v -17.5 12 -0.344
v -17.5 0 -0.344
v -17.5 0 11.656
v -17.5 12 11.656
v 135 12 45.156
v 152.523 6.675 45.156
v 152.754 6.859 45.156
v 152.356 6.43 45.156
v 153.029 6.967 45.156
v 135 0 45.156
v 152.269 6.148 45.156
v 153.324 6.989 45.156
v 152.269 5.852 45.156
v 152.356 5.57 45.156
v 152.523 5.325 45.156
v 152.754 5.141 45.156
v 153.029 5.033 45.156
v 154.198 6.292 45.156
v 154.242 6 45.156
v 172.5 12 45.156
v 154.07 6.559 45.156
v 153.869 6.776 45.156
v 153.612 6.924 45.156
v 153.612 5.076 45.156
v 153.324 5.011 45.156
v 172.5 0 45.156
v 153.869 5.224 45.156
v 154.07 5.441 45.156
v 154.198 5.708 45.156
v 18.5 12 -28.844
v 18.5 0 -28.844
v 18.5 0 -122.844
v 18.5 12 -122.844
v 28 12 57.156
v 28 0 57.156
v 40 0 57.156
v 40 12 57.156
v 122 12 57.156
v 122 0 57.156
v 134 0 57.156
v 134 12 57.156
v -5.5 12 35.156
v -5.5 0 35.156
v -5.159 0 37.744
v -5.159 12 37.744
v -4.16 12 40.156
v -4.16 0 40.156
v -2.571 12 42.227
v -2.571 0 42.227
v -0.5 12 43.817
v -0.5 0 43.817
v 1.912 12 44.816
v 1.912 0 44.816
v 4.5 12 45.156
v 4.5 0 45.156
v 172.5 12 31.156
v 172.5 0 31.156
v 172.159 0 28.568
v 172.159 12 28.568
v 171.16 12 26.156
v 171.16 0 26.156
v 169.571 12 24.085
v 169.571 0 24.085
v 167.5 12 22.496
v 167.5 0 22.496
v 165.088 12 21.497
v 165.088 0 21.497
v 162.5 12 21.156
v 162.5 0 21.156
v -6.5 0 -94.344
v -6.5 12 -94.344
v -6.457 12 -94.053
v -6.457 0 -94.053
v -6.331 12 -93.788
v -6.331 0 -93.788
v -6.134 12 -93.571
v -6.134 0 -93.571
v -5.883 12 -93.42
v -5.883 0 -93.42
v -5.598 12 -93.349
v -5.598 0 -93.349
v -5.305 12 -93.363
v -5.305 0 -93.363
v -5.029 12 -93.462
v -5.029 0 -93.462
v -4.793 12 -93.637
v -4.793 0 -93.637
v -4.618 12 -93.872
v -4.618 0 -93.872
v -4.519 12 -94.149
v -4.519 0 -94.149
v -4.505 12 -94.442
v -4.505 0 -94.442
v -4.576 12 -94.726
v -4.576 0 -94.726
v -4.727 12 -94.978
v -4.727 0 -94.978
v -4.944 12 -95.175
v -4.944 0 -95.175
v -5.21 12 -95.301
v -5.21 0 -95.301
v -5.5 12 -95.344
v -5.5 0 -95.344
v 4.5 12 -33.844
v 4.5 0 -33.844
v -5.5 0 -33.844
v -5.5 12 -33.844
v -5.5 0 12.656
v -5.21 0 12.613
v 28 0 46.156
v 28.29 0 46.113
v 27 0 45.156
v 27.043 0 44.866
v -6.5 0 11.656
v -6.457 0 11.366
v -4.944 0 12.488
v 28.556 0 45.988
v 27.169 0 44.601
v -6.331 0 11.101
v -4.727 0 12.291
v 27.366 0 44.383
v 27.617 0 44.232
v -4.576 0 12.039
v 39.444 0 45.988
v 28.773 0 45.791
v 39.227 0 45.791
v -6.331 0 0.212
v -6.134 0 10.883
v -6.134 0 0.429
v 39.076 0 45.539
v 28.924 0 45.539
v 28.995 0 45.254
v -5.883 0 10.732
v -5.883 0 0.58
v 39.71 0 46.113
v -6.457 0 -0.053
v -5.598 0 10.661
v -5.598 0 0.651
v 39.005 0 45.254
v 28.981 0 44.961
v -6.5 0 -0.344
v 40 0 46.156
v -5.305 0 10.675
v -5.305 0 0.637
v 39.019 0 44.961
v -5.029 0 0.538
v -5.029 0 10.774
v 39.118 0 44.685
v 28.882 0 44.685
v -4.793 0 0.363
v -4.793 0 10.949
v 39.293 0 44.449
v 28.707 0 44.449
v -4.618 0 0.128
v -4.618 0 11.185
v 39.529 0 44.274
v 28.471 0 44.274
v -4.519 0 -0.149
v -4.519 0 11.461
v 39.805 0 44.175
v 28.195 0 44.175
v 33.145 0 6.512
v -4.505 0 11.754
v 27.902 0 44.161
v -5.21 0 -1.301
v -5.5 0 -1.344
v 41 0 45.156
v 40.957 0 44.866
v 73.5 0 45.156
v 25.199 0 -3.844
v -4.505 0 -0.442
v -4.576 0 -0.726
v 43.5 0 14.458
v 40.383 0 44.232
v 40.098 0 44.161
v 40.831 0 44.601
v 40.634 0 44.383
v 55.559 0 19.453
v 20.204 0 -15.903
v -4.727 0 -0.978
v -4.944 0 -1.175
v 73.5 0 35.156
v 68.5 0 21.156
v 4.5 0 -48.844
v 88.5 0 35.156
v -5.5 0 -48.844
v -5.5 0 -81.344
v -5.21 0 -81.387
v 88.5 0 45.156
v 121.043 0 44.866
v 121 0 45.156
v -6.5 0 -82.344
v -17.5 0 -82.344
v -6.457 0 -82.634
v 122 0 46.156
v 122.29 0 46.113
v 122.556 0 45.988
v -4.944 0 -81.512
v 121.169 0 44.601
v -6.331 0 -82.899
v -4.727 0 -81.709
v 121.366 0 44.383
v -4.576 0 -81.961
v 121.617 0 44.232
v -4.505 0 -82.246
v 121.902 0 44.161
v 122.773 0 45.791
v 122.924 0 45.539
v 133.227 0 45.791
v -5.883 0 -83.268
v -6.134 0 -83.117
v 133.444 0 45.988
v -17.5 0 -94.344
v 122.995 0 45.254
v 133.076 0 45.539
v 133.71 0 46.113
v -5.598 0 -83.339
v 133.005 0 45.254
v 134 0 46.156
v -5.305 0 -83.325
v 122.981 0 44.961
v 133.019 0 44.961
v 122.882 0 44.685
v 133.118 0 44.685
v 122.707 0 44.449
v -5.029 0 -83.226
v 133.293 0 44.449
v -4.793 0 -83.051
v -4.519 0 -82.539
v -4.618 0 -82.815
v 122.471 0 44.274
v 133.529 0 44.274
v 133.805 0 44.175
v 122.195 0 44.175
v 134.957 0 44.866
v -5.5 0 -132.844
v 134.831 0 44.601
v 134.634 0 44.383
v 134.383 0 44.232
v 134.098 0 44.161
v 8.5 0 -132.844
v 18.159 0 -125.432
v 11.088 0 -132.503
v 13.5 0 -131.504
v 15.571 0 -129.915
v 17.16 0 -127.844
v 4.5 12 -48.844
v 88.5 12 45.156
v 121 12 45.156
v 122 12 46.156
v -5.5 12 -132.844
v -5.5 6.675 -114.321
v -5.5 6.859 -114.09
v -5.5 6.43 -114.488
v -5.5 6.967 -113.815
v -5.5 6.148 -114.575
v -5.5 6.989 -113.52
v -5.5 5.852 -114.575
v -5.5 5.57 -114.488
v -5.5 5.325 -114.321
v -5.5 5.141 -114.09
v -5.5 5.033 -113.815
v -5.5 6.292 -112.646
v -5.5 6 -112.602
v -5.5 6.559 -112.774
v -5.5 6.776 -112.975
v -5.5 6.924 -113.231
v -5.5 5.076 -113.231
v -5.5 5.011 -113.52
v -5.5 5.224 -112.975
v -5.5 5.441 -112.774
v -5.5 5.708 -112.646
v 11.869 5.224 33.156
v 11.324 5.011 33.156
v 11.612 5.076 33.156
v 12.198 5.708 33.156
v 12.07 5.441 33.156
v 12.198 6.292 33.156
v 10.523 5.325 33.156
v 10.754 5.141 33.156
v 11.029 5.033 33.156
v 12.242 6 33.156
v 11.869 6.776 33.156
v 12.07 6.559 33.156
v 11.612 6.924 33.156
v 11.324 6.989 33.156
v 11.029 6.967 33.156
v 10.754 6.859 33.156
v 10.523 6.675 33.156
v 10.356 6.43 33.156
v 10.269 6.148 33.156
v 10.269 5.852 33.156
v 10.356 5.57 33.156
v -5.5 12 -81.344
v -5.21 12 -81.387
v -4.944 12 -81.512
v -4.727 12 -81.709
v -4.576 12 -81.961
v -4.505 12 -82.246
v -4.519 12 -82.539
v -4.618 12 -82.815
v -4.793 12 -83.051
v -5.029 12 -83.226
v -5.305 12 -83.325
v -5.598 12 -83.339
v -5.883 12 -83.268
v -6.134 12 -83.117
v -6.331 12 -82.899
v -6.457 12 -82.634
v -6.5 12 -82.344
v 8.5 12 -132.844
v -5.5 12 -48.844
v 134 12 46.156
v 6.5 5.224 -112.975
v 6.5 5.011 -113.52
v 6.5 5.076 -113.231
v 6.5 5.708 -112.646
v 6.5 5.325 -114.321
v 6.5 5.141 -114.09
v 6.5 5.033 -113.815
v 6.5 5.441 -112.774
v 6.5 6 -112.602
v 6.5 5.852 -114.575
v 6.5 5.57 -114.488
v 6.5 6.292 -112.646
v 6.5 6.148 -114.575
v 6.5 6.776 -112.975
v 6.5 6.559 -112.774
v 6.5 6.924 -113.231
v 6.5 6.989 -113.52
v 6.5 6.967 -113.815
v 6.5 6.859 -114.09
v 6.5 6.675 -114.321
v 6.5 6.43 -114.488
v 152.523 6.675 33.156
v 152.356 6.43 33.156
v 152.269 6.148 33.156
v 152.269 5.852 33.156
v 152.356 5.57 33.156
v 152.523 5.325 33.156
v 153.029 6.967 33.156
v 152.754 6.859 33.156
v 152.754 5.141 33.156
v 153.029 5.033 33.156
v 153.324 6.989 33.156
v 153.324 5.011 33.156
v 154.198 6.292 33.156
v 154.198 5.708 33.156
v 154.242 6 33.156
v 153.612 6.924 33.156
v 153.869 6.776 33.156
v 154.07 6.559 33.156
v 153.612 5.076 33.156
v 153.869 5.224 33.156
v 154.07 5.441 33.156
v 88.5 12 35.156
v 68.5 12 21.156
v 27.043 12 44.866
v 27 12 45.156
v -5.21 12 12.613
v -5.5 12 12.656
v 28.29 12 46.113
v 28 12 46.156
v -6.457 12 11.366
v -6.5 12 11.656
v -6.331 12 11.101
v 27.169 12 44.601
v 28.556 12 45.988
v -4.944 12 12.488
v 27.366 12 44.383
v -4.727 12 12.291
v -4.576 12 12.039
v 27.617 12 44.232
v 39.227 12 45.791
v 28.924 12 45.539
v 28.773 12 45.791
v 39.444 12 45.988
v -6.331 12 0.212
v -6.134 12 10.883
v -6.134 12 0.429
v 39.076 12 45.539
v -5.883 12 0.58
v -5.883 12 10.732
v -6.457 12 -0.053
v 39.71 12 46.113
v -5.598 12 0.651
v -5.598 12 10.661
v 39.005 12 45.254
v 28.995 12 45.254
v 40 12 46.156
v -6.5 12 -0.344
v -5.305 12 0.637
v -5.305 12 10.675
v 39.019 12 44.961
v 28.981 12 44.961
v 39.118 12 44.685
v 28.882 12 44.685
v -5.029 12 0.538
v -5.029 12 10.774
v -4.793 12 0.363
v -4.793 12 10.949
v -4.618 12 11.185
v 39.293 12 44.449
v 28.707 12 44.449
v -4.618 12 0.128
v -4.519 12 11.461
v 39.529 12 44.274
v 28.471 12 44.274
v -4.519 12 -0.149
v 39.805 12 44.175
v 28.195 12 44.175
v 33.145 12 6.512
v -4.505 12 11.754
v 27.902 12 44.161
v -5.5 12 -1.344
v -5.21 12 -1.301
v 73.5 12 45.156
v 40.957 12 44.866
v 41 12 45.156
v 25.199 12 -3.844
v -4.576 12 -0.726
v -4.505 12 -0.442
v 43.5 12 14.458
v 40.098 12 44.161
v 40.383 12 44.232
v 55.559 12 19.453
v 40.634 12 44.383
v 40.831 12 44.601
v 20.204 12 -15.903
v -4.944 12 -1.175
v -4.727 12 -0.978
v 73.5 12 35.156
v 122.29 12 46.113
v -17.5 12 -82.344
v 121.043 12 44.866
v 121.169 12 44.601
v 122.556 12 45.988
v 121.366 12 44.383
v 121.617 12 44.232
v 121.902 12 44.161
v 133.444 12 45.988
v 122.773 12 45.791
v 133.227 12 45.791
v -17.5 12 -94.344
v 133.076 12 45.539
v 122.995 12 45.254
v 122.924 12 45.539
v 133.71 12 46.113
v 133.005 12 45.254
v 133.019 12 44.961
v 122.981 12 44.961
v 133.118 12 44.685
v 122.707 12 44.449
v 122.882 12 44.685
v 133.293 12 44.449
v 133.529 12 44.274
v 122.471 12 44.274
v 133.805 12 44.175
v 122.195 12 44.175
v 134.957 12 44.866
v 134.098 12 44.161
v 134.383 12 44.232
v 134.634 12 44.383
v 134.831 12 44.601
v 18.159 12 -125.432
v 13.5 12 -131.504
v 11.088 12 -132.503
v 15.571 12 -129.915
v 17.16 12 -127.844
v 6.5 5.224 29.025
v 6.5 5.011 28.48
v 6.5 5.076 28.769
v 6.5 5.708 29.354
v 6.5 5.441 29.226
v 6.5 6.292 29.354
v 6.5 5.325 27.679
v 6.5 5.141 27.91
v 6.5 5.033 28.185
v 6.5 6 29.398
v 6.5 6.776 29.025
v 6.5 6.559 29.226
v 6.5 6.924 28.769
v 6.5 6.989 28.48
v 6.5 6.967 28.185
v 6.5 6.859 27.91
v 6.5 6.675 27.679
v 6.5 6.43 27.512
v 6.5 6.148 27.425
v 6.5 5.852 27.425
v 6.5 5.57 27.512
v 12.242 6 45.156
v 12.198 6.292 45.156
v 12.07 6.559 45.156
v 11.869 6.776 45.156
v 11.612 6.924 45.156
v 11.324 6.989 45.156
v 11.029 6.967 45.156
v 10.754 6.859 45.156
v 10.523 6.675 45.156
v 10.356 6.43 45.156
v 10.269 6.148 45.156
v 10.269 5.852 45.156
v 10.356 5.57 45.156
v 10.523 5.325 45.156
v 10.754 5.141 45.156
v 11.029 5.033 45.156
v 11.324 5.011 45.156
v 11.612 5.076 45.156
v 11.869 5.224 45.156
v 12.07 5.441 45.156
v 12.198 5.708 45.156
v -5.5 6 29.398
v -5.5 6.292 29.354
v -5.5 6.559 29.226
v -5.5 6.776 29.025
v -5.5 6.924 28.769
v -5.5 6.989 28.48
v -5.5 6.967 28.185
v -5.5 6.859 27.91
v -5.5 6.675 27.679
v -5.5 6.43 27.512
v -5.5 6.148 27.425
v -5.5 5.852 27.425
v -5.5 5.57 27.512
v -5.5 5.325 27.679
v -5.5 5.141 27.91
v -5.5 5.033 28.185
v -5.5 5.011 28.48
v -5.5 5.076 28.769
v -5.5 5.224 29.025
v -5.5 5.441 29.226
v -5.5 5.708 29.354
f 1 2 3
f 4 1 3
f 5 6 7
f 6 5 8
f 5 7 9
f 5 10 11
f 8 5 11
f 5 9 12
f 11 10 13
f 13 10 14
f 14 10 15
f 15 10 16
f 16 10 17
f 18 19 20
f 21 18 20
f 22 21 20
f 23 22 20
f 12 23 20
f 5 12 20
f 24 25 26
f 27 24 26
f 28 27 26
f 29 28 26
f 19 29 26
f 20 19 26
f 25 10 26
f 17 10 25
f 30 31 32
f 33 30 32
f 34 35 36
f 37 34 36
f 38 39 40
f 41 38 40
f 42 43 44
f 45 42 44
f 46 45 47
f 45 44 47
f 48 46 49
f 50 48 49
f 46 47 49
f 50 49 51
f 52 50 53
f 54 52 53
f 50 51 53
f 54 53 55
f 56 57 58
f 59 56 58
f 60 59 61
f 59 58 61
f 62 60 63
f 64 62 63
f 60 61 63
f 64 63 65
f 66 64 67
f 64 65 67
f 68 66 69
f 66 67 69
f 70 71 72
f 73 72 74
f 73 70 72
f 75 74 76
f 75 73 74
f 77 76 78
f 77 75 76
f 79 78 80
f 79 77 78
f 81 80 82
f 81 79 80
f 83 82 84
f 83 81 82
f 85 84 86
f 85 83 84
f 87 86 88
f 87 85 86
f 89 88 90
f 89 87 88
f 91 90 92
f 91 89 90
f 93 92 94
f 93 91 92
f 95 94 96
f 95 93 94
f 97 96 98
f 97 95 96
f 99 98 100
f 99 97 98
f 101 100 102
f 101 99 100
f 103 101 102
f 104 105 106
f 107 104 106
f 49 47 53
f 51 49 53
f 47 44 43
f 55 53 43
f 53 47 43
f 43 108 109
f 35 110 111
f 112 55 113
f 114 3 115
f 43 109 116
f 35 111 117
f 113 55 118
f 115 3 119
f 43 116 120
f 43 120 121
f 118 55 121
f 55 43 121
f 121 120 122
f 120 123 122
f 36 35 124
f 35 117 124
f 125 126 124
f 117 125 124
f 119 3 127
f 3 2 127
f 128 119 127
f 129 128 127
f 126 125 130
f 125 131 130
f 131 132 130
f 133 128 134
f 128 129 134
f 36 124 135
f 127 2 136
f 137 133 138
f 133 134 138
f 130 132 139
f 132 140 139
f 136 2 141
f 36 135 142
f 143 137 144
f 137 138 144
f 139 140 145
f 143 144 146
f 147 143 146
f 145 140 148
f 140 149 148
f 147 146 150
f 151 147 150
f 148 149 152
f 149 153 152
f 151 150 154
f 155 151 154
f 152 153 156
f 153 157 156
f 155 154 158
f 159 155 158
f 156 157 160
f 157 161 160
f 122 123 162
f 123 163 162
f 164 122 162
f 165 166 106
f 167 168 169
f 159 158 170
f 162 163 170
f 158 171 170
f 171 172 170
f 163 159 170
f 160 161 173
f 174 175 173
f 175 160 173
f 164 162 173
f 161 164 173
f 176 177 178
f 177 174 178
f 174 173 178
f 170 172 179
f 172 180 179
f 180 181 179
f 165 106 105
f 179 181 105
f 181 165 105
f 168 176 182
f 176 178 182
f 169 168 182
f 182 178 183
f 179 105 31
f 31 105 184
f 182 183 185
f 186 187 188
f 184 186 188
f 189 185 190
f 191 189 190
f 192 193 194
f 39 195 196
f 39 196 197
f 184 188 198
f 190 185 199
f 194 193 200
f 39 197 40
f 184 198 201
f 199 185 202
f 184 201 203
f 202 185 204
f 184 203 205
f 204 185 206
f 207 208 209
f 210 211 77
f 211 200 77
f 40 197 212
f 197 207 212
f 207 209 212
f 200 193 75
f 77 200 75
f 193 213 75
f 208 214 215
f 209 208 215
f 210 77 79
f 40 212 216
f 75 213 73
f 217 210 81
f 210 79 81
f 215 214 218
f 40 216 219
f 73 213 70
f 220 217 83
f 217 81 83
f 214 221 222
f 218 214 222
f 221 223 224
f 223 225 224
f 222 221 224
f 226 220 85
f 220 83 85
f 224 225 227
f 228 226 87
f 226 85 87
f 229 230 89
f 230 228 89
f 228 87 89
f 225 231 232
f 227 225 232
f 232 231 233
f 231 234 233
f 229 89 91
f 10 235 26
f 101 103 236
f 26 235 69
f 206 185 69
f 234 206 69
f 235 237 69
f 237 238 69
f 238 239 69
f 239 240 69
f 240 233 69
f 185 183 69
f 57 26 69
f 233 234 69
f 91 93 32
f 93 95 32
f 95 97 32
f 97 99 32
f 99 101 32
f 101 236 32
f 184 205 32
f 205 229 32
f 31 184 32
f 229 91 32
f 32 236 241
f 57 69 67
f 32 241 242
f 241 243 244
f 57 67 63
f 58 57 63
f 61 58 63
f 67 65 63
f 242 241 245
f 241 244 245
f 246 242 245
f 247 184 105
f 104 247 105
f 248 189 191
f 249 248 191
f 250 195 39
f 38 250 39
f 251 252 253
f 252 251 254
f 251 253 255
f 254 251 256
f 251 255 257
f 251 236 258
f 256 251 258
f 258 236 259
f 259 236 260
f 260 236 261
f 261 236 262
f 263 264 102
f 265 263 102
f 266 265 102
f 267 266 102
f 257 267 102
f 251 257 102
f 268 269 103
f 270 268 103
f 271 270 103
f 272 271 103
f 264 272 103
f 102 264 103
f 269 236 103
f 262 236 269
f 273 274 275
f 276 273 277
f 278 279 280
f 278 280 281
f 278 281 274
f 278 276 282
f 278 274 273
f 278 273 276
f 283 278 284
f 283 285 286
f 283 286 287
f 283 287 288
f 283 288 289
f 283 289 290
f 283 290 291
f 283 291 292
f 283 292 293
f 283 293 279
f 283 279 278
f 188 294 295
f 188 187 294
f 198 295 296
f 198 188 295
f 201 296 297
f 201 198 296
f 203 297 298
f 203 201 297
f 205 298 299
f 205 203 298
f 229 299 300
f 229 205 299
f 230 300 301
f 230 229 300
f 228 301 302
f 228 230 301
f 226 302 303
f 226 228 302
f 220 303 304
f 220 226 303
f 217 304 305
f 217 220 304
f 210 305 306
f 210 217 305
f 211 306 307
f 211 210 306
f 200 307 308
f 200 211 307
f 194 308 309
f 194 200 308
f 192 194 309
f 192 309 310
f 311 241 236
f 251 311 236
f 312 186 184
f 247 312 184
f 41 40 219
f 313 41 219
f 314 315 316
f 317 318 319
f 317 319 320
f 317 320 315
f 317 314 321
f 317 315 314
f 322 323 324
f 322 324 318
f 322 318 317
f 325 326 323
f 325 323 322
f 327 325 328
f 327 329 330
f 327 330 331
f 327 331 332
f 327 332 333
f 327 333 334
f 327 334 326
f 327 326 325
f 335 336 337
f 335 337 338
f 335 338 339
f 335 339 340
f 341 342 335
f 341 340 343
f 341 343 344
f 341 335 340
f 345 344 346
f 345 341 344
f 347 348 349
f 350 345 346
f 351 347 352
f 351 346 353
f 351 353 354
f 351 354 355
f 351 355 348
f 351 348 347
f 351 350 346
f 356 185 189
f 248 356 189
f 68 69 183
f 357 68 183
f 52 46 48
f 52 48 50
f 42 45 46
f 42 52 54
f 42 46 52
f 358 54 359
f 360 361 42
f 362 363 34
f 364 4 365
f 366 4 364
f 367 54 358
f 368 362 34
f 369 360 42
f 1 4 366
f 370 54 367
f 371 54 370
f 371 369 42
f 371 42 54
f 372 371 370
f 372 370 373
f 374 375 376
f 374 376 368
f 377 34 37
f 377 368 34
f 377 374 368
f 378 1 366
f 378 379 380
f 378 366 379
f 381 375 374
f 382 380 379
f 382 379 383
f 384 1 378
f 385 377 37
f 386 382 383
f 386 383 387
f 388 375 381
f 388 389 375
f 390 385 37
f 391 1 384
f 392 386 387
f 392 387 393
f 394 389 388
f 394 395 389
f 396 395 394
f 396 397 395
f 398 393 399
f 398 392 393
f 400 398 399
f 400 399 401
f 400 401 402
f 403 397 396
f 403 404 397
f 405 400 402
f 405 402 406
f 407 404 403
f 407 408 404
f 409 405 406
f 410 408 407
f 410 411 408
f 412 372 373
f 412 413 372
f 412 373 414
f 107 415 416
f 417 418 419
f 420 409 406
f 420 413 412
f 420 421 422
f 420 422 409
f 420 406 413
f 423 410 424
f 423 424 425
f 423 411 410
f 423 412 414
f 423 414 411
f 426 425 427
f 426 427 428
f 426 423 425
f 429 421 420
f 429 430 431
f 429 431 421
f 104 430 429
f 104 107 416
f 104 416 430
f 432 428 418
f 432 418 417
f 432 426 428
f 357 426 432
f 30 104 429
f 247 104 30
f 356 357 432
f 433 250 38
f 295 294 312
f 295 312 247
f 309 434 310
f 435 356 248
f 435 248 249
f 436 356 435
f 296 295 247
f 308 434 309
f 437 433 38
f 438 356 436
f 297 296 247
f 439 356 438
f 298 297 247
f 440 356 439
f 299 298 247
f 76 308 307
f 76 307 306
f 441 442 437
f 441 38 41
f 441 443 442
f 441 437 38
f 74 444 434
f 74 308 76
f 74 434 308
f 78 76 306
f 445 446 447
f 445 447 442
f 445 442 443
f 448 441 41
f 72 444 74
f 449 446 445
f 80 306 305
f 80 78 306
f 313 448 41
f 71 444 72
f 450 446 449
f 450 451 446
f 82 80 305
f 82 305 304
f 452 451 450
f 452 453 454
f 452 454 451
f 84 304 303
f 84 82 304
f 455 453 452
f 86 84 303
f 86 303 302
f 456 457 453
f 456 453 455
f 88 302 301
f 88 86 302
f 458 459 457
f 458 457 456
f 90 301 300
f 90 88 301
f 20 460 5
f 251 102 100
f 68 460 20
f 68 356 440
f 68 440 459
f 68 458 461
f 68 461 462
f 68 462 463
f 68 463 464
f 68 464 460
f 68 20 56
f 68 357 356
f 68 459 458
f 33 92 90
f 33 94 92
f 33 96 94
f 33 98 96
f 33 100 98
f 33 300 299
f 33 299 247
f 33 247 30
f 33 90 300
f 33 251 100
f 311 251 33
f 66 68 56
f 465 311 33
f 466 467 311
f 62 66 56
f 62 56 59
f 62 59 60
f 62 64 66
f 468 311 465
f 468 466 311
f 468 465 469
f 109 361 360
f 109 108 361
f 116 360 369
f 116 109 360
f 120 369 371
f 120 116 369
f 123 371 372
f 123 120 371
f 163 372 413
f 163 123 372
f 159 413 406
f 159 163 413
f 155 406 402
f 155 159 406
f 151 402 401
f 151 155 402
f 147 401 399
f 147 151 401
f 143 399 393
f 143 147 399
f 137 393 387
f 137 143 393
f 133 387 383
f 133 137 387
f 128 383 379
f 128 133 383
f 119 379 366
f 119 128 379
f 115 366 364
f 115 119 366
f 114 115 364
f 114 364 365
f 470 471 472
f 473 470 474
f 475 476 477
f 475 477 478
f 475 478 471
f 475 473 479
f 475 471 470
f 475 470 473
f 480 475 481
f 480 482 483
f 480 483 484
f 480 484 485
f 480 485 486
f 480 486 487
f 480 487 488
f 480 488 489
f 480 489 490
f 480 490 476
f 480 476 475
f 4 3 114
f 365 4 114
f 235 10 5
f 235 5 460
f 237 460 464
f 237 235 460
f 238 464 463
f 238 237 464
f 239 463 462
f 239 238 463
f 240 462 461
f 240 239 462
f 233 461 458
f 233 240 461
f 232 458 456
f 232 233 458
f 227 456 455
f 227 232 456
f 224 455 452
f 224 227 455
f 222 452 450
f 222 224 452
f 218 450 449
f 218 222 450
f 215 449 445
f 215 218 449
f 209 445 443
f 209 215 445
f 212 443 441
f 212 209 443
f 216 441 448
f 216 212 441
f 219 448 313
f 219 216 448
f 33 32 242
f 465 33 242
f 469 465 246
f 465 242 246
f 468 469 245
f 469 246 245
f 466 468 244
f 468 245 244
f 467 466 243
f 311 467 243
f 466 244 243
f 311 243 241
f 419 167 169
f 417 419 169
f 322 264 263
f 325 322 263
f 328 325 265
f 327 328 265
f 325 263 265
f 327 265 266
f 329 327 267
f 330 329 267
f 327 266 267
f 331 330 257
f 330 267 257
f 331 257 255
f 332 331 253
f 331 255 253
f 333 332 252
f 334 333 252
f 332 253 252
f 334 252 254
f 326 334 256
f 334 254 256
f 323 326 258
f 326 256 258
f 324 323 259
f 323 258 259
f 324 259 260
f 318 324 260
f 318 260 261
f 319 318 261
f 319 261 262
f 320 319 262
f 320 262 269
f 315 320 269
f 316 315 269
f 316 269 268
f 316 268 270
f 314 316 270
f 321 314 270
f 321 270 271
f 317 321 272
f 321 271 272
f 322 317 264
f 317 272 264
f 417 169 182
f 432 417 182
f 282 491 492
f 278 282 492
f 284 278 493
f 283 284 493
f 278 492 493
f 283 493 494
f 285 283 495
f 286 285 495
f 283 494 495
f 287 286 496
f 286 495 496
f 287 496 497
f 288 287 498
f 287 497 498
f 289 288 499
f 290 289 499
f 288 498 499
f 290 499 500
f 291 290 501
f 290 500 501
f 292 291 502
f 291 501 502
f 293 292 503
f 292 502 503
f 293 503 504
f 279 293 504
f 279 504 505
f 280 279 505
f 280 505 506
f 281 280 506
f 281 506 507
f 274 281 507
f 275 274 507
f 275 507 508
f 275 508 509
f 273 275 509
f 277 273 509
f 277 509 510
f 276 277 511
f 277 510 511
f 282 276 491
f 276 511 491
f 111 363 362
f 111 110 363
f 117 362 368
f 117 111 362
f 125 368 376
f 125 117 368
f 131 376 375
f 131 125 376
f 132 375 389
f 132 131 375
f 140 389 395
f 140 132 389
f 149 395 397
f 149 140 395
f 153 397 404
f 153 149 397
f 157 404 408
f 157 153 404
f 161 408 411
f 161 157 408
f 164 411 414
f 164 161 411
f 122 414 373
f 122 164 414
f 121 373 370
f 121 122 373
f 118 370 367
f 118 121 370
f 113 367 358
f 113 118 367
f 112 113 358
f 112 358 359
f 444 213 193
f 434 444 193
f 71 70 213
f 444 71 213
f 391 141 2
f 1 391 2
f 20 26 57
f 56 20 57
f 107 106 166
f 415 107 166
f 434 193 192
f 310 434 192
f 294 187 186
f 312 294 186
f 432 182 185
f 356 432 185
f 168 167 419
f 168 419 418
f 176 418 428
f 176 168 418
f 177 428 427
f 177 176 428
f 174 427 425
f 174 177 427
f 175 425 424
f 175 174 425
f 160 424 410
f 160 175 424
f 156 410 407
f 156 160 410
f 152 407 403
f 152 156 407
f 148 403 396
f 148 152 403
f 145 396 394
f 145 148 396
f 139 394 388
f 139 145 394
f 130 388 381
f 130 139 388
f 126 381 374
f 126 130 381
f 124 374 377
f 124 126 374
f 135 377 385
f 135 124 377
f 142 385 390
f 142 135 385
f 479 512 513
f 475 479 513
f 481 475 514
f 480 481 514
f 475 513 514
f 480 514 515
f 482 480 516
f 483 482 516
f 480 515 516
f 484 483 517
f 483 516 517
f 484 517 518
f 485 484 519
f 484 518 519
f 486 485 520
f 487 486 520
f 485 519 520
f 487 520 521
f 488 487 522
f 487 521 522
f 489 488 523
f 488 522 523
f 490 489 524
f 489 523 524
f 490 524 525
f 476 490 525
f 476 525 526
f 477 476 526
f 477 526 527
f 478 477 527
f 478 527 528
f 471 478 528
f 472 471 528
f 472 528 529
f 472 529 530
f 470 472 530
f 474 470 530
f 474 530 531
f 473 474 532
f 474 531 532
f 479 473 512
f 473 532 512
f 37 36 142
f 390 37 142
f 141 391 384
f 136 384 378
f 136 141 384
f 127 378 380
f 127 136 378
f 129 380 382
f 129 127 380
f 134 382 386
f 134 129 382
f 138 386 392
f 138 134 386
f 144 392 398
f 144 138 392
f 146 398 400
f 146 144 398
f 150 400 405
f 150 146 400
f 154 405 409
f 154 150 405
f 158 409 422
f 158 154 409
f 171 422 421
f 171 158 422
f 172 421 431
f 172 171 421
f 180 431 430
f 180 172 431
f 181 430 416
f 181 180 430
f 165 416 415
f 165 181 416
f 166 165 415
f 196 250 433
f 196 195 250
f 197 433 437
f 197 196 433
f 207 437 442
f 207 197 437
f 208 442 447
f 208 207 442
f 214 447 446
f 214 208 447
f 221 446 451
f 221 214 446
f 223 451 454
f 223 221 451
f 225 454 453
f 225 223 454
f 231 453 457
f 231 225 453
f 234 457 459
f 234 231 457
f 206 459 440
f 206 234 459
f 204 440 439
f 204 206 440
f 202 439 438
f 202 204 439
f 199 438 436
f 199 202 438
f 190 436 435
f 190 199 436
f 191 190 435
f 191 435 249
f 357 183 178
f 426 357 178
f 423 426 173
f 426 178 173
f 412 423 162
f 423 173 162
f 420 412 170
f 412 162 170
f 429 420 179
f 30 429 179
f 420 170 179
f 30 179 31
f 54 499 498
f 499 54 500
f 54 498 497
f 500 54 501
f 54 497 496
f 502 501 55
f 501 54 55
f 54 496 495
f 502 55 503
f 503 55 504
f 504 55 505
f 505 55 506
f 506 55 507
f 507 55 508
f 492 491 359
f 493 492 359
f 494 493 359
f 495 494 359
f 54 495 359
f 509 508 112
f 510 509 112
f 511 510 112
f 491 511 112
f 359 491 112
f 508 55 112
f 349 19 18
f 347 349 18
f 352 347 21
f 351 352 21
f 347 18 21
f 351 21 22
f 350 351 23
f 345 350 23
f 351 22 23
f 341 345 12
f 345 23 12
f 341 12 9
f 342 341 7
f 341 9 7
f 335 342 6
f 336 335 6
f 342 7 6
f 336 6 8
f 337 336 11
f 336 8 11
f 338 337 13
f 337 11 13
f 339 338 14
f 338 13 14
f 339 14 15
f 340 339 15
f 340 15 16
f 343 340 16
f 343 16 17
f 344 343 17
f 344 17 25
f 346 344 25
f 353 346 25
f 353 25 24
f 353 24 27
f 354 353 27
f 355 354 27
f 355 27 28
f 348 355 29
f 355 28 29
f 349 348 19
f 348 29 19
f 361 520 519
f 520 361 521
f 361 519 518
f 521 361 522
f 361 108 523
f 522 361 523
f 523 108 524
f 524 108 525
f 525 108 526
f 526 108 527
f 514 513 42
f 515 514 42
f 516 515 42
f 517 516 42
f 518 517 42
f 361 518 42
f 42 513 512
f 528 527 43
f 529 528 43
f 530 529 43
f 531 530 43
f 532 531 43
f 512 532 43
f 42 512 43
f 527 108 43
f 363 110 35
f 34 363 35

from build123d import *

# Parameters (mm, degrees)
BOSS_EXTRUDE1_DEPTH = 12
SKETCH2_R           = 0.9921875
CUT_EXTRUDE1_DEPTH  = 12
SKETCH3_R           = 0.9921875
CUT_EXTRUDE2_DEPTH  = 12
SKETCH4_R           = 1
CUT_EXTRUDE3_DEPTH  = 219.054378342


with BuildPart() as part:
    # Sketch1 → Boss-Extrude1 (new body)
    with BuildSketch(Plane(origin=(0, 0, 0), x_dir=(1, 0, 0), z_dir=(0, 1, 0))):
        with BuildLine():
            Line((-5.5, 132.84375), (-5.5, 94.34375))
            Line((-5.5, 94.34375), (-17.5, 94.34375))
            Line((-17.5, 94.34375), (-17.5, 82.34375))
            Line((-17.5, 82.34375), (-5.5, 82.34375))
            Line((-5.5, 82.34375), (-5.5, 48.84375))
            Line((-5.5, 48.84375), (4.5, 48.84375))
            Line((4.5, 48.84375), (4.5, 33.84375))
            Line((4.5, 33.84375), (-5.5, 33.84375))
            Line((-5.5, 33.84375), (-5.5, 0.34375))
            Line((-5.5, 0.34375), (-17.5, 0.34375))
            Line((-17.5, 0.34375), (-17.5, -11.65625))
            Line((-17.5, -11.65625), (-5.5, -11.65625))
            Line((-5.5, -11.65625), (-5.5, -35.15625))
            ThreePointArc((-5.5, -35.15625), (-2.571067812, -42.227317812), (4.5, -45.15625))
            Line((4.5, -45.15625), (28, -45.15625))
            Line((28, -45.15625), (28, -57.15625))
            Line((28, -57.15625), (40, -57.15625))
            Line((40, -57.15625), (40, -45.15625))
            Line((40, -45.15625), (73.5, -45.15625))
            Line((73.5, -45.15625), (73.5, -35.15625))
            Line((73.5, -35.15625), (88.5, -35.15625))
            Line((88.5, -35.15625), (88.5, -45.15625))
            Line((88.5, -45.15625), (122, -45.15625))
            Line((122, -45.15625), (122, -57.15625))
            Line((122, -57.15625), (134, -57.15625))
            Line((134, -57.15625), (134, -45.15625))
            Line((134, -45.15625), (172.5, -45.15625))
            Line((172.5, -45.15625), (172.5, -31.15625))
            ThreePointArc((172.5, -31.15625), (169.571067812, -24.085182188), (162.5, -21.15625))
            Line((162.5, -21.15625), (68.5, -21.15625))
            ThreePointArc((68.5, -21.15625), (33.144660941, -6.511589059), (18.5, 28.84375))
            Line((18.5, 28.84375), (18.5, 122.84375))
            ThreePointArc((18.5, 122.84375), (15.571067812, 129.914817812), (8.5, 132.84375))
            Line((8.5, 132.84375), (-5.5, 132.84375))
        make_face()
    extrude(amount=BOSS_EXTRUDE1_DEPTH)

    # Sketch2 → Cut-Extrude1 (cut)
    with BuildSketch(Plane.XY.offset(45.15625)):
        with Locations((153.25, 6)):
            Circle(SKETCH2_R)
        with Locations((11.25, 6)):
            Circle(SKETCH2_R)
    extrude(amount=-CUT_EXTRUDE1_DEPTH, mode=Mode.SUBTRACT)

    # Sketch3 → Cut-Extrude2 (cut)
    with BuildSketch(Plane.ZY.offset(5.5)):
        with Locations((28.40625, 6)):
            Circle(SKETCH3_R)
        with Locations((-113.59375, 6)):
            Circle(SKETCH3_R)
    extrude(amount=-CUT_EXTRUDE2_DEPTH, mode=Mode.SUBTRACT)

    # Sketch4 → Cut-Extrude3 (cut, through all)
    with BuildSketch(Plane(origin=(0, 0, 0), x_dir=(1, 0, 0), z_dir=(0, 1, 0))):
        with Locations((-5.5, 94.34375)):
            Circle(SKETCH4_R)
        with Locations((-5.5, 82.34375)):
            Circle(SKETCH4_R)
        with Locations((-5.5, 0.34375)):
            Circle(SKETCH4_R)
        with Locations((-5.5, -11.65625)):
            Circle(SKETCH4_R)
        with Locations((28, -45.15625)):
            Circle(SKETCH4_R)
        with Locations((40, -45.15625)):
            Circle(SKETCH4_R)
        with Locations((122, -45.15625)):
            Circle(SKETCH4_R)
        with Locations((134, -45.15625)):
            Circle(SKETCH4_R)
    extrude(amount=CUT_EXTRUDE3_DEPTH, mode=Mode.SUBTRACT)


solid = part.part
